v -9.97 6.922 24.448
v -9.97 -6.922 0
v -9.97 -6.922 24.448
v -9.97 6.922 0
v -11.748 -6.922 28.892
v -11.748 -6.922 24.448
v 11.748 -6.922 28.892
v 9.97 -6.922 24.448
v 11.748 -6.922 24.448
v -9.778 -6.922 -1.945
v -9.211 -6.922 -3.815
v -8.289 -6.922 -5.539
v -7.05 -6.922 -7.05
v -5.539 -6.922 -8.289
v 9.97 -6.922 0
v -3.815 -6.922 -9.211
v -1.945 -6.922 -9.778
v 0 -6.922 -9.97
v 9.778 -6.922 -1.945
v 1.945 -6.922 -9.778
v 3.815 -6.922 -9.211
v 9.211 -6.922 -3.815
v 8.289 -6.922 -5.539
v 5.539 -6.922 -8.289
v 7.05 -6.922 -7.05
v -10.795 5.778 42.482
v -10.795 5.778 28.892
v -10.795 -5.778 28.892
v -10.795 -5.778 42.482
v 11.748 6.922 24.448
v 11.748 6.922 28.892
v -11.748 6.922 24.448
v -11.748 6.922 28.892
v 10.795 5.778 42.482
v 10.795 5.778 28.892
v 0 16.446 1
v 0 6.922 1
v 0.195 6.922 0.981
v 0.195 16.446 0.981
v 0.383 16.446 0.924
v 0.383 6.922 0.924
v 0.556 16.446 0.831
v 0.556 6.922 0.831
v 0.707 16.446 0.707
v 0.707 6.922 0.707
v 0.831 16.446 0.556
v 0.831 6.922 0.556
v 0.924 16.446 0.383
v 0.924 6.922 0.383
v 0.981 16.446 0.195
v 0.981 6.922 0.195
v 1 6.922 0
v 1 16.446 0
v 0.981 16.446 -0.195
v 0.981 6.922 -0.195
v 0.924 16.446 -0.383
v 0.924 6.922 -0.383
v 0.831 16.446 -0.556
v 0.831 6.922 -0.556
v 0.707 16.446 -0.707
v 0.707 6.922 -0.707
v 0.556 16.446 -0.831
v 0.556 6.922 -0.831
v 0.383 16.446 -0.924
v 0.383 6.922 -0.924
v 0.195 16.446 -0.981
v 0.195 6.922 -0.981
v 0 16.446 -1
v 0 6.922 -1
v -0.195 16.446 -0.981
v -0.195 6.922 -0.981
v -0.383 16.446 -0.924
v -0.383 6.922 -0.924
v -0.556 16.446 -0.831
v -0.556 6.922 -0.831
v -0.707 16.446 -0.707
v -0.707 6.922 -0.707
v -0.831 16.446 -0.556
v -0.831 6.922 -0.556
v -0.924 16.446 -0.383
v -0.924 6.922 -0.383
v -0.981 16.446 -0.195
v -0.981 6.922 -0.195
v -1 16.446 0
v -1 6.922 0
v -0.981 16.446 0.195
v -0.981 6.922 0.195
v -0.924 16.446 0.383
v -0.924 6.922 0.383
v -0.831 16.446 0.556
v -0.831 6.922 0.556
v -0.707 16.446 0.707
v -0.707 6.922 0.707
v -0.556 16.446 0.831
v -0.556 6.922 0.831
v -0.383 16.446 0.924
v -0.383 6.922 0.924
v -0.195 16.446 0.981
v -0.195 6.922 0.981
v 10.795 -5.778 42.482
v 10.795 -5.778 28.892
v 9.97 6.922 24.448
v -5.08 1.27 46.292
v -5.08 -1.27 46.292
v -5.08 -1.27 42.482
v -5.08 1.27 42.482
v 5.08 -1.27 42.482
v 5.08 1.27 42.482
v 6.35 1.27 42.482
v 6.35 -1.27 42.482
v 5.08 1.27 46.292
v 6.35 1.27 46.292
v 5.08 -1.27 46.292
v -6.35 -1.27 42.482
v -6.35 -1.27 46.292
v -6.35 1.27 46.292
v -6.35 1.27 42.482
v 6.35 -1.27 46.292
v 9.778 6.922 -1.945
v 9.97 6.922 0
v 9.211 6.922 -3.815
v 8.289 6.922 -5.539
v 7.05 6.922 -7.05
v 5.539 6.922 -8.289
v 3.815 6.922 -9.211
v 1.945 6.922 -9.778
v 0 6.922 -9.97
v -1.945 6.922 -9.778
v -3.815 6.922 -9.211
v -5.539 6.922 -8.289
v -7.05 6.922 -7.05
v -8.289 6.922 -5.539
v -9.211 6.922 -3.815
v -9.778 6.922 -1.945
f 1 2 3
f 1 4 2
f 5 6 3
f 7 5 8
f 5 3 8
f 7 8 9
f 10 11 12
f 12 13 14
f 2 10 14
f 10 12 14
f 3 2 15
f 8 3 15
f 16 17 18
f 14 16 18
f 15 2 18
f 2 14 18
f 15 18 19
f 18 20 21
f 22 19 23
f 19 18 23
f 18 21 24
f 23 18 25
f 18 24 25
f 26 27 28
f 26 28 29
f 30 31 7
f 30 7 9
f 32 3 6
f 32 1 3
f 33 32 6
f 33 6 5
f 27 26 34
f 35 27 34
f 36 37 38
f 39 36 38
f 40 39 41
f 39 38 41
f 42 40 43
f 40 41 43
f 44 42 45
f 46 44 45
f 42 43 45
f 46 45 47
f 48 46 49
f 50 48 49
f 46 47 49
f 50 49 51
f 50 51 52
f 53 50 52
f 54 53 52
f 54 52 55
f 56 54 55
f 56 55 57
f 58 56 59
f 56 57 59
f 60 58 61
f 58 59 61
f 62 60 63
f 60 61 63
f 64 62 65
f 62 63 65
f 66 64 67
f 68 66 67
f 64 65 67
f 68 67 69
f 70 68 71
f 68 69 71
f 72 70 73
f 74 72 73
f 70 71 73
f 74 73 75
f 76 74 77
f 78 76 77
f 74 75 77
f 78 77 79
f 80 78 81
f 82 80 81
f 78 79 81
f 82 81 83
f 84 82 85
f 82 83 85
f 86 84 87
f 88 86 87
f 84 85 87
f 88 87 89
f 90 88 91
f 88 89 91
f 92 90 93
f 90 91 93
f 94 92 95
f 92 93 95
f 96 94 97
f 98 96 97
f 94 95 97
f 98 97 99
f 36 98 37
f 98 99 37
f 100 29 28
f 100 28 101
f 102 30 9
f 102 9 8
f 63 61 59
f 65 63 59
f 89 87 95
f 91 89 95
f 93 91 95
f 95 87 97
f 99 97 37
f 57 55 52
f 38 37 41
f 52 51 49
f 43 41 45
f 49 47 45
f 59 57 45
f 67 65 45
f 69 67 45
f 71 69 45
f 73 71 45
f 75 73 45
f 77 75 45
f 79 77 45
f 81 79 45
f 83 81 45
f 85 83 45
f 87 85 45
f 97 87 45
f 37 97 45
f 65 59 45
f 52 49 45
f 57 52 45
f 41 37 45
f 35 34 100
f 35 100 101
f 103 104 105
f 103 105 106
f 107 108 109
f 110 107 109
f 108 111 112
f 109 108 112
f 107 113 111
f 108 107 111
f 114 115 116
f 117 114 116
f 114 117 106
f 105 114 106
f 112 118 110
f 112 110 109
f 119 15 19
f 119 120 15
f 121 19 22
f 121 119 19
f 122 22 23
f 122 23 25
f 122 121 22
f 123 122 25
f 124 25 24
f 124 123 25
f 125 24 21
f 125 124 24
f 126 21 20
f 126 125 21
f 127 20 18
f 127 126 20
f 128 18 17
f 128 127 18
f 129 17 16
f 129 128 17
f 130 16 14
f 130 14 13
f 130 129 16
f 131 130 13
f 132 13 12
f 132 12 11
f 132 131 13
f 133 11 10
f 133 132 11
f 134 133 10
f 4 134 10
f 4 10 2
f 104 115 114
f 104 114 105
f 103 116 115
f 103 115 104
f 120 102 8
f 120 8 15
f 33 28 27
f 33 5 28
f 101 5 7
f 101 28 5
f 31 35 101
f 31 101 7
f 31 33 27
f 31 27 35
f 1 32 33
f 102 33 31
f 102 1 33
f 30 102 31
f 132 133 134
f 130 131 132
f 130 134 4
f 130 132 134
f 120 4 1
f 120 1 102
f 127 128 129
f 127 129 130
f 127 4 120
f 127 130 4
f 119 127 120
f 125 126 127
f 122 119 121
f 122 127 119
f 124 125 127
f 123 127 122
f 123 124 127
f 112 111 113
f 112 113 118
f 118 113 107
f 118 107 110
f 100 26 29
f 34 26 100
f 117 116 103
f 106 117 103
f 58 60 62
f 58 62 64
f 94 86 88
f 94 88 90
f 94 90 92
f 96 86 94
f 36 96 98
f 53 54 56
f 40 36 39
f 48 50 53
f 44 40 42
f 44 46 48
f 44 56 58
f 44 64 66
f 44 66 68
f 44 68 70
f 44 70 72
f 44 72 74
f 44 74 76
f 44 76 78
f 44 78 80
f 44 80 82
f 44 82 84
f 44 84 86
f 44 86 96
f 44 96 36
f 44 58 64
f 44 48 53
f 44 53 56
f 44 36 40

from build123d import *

# Parameters (mm, degrees)
EXTRUDE1_DEPTH     = 6.9215
SKETCH2_W          = 23.495
SKETCH2_H          = 1.143
CUT_EXTRUDE1_DEPTH = 13.589
SKETCH3_R          = 1
EXTRUDE2_DEPTH     = 9.525
SKETCH4_W          = 1.27
SKETCH4_H          = 2.54
EXTRUDE3_DEPTH     = 3.81
EXTRUDE3_2_DEPTH   = 3.81


with BuildPart() as part:
    # Sketch1 → Extrude1 (new body, symmetric)
    with BuildSketch(Plane(origin=(0, 0, 0), x_dir=(1, 0, 0), z_dir=(0, 1, 0))):
        with BuildLine():
            Line((-9.9695, -24.4475), (-11.7475, -24.4475))
            Line((-11.7475, -24.4475), (-11.7475, -28.8925))
            Line((-11.7475, -28.8925), (-10.795, -28.8925))
            Line((-10.795, -28.8925), (-10.795, -42.4815))
            Line((-10.795, -42.4815), (10.795, -42.4815))
            Line((10.795, -42.4815), (10.795, -28.8925))
            Line((10.795, -28.8925), (11.7475, -28.8925))
            Line((11.7475, -28.8925), (11.7475, -24.4475))
            Line((11.7475, -24.4475), (9.9695, -24.4475))
            Line((9.9695, -24.4475), (9.9695, 0))
            ThreePointArc((9.9695, 0), (0, 9.9695), (-9.9695, 0))
            Line((-9.9695, 0), (-9.9695, -24.4475))
        make_face()
    extrude(amount=EXTRUDE1_DEPTH, both=True)

    # Sketch2 → Cut-Extrude1 (cut)
    with BuildSketch(Plane.XY.offset(42.4815)):
        with Locations((0, 6.35)):
            Rectangle(SKETCH2_W, SKETCH2_H)
        with Locations((0, -6.35)):
            Rectangle(SKETCH2_W, SKETCH2_H)
    extrude(amount=-CUT_EXTRUDE1_DEPTH, mode=Mode.SUBTRACT)


with BuildPart() as body_2:
    # Sketch3 → Extrude2 (new body)
    with BuildSketch(Plane(origin=(0, 6.9215, 0), x_dir=(1, 0, 0), z_dir=(0, 1, 0))):
        with Locations(Location((0, 0, 0), (0, 0, 270))):  # turned: the seam where the file's is
            Circle(SKETCH3_R)
    extrude(amount=EXTRUDE2_DEPTH)


with BuildPart() as body_3:
    # Sketch4 → Extrude3 (new body)
    with BuildSketch(Plane.XY.offset(42.4815)):
        with Locations((-5.715, 0)):
            Rectangle(SKETCH4_W, SKETCH4_H)
    extrude(amount=EXTRUDE3_DEPTH)


with BuildPart() as body_4:
    # Sketch4 → Extrude3 2 (new body)
    with BuildSketch(Plane.XY.offset(42.4815)):
        with Locations((5.715, 0)):
            Rectangle(SKETCH4_W, SKETCH4_H)
    extrude(amount=EXTRUDE3_2_DEPTH)


solid = Compound([part.part, body_2.part, body_3.part, body_4.part])
